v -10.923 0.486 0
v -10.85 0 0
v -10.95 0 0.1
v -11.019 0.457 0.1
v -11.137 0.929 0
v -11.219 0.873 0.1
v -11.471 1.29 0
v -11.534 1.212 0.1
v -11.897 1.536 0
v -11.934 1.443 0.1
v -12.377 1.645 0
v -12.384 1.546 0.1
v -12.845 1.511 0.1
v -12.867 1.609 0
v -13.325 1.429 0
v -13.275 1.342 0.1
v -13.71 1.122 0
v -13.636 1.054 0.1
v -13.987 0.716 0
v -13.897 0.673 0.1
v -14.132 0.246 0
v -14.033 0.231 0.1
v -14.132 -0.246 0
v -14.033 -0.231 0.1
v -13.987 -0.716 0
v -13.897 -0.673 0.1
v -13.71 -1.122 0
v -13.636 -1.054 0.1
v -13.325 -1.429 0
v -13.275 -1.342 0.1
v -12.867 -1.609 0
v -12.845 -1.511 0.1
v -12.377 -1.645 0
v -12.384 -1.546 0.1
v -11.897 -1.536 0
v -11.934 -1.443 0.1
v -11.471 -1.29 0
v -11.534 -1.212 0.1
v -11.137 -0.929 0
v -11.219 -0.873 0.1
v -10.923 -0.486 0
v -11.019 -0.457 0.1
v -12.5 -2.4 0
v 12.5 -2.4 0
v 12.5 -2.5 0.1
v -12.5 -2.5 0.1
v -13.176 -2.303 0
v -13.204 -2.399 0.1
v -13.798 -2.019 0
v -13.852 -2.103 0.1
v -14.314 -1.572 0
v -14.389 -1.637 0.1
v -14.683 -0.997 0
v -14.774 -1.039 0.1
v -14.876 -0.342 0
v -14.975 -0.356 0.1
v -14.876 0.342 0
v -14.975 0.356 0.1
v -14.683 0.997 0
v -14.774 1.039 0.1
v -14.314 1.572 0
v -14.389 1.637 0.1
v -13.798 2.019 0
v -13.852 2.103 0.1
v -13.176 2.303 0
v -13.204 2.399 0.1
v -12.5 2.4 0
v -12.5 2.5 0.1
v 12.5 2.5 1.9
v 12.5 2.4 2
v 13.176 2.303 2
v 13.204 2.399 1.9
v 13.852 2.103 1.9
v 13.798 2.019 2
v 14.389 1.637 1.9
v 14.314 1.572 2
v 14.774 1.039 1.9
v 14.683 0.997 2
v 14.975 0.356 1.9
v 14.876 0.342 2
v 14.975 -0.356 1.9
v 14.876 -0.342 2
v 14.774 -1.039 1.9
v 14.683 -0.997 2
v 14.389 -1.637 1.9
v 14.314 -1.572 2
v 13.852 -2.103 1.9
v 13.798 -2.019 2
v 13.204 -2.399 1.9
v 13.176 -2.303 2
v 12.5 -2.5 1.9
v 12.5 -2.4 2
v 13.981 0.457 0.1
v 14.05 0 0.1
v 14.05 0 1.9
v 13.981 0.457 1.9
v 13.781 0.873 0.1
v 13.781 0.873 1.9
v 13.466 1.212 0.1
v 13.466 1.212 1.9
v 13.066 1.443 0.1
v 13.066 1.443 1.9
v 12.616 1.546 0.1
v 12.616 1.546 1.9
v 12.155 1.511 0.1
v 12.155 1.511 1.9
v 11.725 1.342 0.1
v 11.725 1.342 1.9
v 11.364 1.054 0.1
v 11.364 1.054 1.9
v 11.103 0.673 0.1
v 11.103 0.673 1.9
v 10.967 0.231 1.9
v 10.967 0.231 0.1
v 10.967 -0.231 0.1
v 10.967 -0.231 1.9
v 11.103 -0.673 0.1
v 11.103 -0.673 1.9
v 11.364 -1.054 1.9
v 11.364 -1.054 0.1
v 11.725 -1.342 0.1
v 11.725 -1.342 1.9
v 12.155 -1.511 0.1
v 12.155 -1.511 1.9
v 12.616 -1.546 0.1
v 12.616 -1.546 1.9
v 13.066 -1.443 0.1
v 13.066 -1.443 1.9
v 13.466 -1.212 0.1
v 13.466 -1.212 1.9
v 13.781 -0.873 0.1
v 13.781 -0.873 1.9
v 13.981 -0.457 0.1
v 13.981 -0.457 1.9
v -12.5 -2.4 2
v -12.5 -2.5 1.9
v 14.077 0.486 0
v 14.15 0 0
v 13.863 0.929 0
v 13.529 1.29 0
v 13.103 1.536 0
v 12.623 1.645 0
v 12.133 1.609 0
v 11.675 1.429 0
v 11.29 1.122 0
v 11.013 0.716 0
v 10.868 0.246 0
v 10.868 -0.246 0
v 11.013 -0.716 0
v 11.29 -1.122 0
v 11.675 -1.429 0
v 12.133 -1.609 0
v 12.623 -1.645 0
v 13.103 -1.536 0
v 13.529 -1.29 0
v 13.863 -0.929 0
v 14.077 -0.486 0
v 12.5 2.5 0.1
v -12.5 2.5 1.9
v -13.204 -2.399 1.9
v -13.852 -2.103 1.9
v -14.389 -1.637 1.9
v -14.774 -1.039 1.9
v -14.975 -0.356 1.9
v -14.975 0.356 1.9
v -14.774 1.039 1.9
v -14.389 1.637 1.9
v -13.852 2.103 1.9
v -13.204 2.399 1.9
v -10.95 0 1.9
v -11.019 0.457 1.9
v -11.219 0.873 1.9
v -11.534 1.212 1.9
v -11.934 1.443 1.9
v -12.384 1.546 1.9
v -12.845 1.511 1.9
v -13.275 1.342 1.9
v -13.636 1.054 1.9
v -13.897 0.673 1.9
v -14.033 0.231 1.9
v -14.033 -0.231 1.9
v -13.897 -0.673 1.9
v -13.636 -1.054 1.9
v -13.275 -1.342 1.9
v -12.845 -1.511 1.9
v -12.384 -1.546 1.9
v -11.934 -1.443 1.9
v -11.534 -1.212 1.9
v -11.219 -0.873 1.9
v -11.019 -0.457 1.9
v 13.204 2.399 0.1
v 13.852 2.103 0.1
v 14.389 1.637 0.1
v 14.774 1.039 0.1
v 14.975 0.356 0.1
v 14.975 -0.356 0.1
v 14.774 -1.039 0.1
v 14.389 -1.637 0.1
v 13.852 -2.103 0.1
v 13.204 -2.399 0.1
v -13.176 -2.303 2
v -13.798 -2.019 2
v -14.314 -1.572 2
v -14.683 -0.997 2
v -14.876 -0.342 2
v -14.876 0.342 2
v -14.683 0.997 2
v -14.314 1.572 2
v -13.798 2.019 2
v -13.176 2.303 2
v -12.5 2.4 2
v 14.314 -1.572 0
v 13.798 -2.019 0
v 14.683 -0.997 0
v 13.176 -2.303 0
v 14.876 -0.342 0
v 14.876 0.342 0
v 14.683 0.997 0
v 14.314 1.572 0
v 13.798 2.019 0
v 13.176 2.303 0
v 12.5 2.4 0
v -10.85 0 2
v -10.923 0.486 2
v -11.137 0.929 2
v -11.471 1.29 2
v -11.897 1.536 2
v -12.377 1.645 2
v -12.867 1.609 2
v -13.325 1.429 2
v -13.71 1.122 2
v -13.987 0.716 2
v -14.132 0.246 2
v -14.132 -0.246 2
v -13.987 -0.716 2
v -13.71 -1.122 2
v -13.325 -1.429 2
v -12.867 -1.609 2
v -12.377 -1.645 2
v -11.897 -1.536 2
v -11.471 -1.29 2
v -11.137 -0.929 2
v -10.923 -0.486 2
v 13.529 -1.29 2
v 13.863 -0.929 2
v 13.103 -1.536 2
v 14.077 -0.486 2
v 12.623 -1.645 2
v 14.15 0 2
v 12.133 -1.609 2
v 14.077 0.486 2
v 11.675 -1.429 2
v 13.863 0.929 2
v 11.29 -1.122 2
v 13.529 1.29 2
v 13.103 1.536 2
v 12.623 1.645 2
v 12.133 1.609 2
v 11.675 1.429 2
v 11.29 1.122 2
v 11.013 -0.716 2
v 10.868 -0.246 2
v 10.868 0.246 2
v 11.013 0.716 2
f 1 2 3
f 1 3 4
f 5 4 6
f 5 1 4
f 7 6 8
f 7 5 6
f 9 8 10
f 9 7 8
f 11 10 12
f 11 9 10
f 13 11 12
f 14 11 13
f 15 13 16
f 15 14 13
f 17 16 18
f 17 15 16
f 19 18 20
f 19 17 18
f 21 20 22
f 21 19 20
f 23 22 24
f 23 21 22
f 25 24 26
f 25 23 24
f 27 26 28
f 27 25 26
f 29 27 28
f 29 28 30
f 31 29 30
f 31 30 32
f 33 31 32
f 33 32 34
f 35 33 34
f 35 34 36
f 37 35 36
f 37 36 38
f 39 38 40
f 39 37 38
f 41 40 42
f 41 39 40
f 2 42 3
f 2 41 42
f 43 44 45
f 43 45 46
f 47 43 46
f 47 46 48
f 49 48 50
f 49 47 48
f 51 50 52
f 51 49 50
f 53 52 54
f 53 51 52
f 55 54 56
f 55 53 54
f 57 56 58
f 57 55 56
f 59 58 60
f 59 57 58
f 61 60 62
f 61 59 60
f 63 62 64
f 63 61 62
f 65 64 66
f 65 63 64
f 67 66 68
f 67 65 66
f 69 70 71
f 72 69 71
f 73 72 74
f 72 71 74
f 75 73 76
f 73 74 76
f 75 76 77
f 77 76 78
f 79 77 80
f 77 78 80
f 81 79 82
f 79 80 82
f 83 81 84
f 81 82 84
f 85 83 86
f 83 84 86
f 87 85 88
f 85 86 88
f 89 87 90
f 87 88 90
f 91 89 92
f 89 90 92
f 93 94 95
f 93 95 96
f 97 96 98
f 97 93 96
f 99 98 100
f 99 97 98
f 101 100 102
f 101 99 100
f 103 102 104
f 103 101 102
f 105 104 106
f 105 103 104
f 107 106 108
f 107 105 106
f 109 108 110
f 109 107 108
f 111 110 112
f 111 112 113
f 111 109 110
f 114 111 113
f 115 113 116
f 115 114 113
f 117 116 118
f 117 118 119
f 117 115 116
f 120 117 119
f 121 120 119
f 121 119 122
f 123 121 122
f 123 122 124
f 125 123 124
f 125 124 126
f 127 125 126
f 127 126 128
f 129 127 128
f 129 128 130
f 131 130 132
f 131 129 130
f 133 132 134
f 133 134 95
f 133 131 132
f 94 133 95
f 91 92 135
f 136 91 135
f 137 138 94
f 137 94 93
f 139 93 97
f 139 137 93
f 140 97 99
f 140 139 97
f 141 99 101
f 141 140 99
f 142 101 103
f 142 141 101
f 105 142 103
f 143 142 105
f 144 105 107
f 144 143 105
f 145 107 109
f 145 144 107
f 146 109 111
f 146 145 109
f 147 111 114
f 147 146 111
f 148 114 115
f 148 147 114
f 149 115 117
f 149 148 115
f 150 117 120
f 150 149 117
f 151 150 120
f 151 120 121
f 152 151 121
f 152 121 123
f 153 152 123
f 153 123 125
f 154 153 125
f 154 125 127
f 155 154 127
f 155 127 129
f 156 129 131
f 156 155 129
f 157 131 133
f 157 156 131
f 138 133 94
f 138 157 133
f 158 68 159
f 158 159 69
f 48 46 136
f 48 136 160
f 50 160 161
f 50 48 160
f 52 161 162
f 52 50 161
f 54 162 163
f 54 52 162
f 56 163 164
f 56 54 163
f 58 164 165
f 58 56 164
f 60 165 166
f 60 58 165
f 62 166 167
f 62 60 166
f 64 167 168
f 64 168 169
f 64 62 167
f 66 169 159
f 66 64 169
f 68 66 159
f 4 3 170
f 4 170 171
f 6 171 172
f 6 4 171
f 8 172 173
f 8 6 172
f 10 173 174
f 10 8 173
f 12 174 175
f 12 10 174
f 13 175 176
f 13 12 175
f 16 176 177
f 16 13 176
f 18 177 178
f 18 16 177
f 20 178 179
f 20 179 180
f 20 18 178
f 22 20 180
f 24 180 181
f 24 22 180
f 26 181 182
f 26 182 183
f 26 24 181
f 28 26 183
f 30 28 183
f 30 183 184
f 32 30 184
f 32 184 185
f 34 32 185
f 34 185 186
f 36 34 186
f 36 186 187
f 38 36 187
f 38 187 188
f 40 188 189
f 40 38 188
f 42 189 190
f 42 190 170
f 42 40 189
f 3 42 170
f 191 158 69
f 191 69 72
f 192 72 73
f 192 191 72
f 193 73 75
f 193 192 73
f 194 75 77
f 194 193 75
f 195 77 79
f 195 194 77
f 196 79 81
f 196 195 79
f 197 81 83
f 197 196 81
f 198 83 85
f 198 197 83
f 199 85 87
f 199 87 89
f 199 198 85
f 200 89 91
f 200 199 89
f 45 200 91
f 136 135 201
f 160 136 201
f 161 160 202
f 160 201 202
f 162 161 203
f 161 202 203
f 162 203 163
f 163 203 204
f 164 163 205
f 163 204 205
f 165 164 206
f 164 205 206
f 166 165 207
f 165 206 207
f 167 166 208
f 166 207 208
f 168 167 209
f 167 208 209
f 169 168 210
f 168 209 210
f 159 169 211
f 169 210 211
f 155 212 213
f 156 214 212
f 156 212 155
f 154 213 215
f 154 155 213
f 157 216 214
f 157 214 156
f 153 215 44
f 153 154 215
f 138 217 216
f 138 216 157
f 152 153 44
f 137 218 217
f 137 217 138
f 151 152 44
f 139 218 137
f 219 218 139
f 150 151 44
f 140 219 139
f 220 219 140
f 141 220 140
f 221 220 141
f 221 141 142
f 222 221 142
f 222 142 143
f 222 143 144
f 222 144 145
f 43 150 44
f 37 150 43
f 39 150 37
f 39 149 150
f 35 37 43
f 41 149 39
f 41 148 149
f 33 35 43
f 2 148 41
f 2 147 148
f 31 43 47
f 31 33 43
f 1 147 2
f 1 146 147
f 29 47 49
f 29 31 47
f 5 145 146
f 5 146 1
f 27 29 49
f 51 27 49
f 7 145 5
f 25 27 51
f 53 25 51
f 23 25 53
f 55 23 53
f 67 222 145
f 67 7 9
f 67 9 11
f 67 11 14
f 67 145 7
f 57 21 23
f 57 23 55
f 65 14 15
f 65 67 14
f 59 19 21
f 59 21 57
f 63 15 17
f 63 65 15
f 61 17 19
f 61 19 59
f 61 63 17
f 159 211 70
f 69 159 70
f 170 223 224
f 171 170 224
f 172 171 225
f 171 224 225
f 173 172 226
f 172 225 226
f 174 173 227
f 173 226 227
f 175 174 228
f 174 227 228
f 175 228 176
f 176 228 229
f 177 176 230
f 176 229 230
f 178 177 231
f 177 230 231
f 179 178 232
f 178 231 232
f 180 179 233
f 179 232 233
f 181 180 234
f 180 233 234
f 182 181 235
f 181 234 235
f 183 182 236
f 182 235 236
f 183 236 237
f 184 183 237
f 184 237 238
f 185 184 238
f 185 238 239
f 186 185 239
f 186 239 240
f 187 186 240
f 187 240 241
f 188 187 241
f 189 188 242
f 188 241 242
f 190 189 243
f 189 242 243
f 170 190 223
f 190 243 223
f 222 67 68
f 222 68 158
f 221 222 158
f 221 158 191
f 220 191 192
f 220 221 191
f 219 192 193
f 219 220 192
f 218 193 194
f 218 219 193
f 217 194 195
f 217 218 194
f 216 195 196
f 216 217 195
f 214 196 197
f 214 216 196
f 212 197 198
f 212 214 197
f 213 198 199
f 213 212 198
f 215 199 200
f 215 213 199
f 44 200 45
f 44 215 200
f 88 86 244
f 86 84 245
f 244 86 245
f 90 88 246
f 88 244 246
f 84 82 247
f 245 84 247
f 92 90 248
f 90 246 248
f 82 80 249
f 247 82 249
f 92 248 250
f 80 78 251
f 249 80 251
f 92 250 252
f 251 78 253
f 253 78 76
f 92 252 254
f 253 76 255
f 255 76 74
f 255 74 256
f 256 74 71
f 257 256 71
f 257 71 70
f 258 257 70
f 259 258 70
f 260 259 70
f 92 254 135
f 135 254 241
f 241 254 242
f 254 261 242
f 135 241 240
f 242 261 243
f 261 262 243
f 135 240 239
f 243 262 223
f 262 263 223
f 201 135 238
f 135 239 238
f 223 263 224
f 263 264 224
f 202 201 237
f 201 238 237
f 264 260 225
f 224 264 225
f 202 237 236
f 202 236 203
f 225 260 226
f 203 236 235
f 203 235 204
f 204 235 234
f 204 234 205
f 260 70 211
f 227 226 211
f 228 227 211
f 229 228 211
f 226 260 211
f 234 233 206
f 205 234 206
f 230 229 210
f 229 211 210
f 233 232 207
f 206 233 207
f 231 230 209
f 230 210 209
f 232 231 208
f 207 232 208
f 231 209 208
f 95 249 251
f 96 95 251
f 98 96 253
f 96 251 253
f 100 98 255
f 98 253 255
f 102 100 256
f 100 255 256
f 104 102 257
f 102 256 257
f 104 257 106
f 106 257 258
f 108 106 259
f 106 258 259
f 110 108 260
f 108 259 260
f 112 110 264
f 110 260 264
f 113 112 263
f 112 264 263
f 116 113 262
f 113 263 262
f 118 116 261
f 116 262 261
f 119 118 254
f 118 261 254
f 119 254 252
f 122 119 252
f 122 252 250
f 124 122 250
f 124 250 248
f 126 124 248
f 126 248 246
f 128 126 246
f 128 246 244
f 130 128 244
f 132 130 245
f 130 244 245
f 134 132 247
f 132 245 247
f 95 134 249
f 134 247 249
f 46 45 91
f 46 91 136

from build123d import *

# Parameters (mm, degrees)
SKETCH1_R           = 1.55
BOSS_EXTRUDE1_DEPTH = 2
CHAMFER1_SIZE       = 0.1


with BuildPart() as part:
    # Sketch1 → Boss-Extrude1 (new body)
    with BuildSketch(Plane.XY):
        with BuildLine():
            Line((-12.5, 2.5), (12.5, 2.5))
            ThreePointArc((12.5, 2.5), (15, 0), (12.5, -2.5))
            Line((12.5, -2.5), (-12.5, -2.5))
            ThreePointArc((-12.5, -2.5), (-15, 0), (-12.5, 2.5))
        make_face()
        with Locations((-12.5, 0)):
            Circle(SKETCH1_R, mode=Mode.SUBTRACT)
        with Locations((12.5, 0)):
            Circle(SKETCH1_R, mode=Mode.SUBTRACT)
    extrude(amount=BOSS_EXTRUDE1_DEPTH)

    # Chamfer1
    chamfer1_edges = [part.edges().sort_by_distance(p)[0] for p in [
        (-14.05, 0, 0),
        (-14.05, 0, 2),
        (15, 0, 2),
        (10.95, 0, 0),
        (10.95, 0, 2),
        (0, 2.5, 2),
        (-15, 0, 2),
        (0, 2.5, 0),
        (15, 0, 0),
        (0, -2.5, 0),
        (-15, 0, 0),
        (0, -2.5, 2),
    ]]
    chamfer(chamfer1_edges, length=CHAMFER1_SIZE)


solid = part.part
